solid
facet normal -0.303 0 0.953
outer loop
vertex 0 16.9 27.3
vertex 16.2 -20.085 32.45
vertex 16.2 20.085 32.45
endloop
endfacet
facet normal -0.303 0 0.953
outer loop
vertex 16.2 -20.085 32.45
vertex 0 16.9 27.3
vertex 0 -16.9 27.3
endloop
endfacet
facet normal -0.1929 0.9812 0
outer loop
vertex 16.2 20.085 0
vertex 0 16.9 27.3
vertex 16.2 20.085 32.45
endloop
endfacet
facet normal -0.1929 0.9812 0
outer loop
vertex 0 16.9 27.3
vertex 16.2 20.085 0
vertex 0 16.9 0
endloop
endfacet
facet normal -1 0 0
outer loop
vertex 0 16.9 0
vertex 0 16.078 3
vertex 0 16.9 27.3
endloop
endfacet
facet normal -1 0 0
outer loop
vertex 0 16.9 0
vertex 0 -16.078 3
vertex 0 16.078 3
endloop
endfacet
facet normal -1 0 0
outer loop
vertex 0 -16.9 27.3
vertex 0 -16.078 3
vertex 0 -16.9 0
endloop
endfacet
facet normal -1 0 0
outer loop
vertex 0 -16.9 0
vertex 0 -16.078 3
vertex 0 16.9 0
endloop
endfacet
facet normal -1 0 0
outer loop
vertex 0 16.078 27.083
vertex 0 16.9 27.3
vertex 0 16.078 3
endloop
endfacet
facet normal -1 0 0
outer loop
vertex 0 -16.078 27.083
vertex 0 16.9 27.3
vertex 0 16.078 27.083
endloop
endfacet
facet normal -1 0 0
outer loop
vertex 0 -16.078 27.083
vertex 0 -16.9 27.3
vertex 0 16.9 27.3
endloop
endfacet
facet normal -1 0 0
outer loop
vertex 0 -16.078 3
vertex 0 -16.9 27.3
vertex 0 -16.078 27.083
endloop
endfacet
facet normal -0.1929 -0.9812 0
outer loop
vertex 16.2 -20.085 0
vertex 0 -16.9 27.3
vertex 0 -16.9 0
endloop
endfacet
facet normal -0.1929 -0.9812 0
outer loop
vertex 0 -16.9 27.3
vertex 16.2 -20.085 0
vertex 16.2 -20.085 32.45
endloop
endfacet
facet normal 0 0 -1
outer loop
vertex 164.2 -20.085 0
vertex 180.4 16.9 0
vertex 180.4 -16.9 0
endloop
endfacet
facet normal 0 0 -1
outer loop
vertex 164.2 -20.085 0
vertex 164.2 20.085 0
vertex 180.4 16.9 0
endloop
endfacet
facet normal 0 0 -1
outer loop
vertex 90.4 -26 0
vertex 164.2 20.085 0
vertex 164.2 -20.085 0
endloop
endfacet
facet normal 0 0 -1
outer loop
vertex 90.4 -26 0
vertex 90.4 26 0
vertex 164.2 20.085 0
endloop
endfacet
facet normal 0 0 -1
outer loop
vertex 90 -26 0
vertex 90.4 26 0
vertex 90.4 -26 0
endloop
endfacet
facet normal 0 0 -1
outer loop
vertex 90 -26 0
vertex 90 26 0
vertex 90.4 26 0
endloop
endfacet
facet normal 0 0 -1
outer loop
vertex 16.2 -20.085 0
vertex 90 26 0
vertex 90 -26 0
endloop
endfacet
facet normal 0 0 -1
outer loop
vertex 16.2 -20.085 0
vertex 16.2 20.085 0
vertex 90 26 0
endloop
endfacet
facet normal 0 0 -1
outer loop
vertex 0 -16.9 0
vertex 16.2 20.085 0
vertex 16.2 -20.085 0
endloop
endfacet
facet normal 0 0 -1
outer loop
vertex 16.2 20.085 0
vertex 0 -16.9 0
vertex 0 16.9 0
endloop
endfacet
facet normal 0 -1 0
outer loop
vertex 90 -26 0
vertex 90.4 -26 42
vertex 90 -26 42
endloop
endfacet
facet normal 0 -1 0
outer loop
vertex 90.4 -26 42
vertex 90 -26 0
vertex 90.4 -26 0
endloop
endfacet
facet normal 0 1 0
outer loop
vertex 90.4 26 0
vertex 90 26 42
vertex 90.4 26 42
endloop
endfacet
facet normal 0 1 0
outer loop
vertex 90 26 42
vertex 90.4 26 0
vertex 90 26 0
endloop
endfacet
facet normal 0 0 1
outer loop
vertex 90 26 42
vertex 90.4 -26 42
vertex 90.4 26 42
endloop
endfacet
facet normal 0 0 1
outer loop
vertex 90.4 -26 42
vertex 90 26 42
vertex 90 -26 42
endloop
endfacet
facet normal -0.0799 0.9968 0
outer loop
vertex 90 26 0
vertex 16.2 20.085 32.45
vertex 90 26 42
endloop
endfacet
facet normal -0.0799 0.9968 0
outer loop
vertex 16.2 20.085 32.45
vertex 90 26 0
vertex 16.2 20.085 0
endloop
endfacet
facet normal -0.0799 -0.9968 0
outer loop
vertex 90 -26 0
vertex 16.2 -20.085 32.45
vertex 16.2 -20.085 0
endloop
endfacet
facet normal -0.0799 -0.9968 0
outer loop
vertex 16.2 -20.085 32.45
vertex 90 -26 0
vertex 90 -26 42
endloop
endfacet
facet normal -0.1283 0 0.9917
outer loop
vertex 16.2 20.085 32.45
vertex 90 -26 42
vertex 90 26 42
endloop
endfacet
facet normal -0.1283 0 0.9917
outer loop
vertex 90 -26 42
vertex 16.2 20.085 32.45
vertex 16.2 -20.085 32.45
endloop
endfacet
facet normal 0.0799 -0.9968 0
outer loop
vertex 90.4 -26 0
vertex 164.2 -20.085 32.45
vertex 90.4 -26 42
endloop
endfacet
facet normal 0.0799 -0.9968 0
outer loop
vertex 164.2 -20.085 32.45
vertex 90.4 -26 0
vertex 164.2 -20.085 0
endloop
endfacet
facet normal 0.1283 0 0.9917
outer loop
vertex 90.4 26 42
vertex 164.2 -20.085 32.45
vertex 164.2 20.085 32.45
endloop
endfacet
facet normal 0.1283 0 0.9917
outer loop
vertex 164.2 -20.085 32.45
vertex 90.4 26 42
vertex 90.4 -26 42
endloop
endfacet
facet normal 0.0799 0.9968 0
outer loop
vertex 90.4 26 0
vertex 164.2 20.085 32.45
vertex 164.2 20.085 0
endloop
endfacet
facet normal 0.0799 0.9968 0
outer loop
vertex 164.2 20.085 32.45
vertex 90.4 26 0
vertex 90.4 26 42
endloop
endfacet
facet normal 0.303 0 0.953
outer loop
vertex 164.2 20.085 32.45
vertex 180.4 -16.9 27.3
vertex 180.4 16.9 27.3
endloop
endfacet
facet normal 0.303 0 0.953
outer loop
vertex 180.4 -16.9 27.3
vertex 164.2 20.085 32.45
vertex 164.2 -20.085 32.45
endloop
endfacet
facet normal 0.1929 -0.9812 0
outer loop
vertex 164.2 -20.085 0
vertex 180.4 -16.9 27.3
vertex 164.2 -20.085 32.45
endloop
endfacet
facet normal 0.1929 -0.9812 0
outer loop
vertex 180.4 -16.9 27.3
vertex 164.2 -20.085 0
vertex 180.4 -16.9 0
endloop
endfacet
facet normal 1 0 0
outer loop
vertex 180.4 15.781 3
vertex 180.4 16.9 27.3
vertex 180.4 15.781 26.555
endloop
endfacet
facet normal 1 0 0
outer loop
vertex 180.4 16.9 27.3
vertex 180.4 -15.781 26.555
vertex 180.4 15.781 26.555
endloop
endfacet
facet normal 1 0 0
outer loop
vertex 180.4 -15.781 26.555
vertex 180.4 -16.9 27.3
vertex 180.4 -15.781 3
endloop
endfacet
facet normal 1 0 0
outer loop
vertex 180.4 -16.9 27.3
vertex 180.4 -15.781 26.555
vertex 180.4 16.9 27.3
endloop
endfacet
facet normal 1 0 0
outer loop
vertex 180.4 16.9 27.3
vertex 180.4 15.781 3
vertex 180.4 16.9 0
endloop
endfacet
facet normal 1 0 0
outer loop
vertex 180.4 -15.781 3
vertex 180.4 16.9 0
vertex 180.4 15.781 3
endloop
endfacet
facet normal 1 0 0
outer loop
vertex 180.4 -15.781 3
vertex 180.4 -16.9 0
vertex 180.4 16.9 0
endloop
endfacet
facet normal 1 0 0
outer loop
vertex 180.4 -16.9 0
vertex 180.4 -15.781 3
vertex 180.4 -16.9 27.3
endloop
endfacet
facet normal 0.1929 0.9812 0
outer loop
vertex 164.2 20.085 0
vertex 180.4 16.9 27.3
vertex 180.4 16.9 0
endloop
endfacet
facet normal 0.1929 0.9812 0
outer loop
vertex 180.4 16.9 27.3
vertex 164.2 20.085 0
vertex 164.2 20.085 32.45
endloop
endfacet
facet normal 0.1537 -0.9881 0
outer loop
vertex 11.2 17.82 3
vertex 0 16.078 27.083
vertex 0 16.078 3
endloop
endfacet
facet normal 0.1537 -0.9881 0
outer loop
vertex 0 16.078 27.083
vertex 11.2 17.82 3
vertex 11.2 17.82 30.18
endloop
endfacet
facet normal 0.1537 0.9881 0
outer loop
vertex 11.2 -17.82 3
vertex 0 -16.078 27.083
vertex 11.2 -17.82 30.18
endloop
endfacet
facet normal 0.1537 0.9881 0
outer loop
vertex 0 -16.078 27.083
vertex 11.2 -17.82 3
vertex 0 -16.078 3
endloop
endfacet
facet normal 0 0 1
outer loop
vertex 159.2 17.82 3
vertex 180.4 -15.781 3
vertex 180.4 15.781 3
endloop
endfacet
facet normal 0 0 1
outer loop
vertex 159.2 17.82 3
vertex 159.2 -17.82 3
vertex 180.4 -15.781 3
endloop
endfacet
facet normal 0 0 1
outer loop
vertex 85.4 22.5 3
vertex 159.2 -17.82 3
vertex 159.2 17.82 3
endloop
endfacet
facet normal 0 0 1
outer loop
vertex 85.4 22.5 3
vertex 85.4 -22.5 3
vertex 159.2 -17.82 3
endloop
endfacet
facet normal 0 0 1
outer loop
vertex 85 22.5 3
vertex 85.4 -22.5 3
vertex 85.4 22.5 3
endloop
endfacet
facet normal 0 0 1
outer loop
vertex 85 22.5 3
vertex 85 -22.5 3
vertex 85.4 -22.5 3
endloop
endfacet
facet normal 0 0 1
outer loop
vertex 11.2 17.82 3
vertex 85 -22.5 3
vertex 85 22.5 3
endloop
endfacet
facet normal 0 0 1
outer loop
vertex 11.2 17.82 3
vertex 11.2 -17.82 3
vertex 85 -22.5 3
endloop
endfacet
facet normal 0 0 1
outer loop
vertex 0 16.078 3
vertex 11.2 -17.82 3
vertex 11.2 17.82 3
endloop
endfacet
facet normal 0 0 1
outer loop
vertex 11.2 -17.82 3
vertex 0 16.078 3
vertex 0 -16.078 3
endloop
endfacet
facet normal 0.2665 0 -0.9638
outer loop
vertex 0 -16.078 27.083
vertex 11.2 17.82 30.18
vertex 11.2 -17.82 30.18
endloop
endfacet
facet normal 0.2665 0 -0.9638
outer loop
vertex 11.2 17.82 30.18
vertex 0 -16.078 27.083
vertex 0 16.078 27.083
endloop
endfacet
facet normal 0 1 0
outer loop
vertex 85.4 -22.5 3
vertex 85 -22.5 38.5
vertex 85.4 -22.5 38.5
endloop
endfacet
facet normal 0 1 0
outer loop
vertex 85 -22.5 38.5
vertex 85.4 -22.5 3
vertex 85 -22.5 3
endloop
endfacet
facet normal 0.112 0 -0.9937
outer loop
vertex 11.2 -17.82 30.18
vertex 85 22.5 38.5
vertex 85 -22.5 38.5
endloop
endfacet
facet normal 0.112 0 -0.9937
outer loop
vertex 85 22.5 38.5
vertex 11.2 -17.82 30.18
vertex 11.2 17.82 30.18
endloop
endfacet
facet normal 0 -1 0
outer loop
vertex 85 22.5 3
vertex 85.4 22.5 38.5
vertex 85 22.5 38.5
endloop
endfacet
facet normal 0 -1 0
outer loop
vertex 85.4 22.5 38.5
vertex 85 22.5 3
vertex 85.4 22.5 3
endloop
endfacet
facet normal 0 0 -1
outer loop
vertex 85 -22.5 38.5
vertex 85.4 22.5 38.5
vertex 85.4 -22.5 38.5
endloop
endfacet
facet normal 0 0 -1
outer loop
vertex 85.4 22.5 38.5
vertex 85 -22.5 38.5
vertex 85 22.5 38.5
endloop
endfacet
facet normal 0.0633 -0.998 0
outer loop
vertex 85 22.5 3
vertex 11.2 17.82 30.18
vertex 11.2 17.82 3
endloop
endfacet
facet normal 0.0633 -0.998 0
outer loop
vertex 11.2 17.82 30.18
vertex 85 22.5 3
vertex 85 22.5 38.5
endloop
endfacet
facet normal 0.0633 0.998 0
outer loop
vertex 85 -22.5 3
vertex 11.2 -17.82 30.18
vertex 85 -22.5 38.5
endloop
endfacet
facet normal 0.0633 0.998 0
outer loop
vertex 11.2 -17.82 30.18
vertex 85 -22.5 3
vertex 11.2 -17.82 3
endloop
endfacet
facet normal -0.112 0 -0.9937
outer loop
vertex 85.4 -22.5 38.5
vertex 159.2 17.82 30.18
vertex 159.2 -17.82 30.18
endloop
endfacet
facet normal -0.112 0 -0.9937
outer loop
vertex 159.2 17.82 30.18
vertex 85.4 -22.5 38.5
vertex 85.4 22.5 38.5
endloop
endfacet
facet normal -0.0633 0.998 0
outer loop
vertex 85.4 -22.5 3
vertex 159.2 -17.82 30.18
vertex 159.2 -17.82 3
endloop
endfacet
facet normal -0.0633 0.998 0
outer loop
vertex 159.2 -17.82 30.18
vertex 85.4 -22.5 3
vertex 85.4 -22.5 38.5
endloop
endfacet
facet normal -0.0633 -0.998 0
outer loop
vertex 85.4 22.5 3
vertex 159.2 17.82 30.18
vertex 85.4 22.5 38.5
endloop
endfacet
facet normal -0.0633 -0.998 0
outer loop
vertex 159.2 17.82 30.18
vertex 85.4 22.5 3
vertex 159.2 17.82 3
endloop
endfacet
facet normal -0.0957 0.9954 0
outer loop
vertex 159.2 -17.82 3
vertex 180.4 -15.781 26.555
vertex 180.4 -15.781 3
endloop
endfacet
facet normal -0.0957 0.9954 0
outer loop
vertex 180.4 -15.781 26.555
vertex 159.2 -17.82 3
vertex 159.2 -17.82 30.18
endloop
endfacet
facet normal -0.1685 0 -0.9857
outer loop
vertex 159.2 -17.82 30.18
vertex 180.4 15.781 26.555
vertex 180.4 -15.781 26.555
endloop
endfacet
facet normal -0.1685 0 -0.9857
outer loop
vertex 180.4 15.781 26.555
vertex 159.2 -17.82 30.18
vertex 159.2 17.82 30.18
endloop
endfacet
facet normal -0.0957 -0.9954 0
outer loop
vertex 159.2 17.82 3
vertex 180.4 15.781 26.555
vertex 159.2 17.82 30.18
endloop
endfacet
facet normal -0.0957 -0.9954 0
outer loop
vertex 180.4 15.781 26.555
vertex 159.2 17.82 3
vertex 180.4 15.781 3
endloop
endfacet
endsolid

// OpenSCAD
$fn = 32;

// ----------------------------------------------------------------------
// Faired channel: 180 x 52 x 42 mm, 3.5 mm walls, faired ends
// ----------------------------------------------------------------------

// --- parameters (mm) ---
length = 180;             // channel length
width = 52;               // channel width at mid length
height = 42;              // channel height at mid length
wall = 3.5;               // side wall thickness
floor_t = 3;              // floor thickness
end_w = 33.8;             // faired end width
end_h = 27.3;             // faired end height

difference() {
  union() {
    hull() {
      translate([0, -16.9, 0]) cube([0.4, 33.8, 27.3]);
      translate([16.2, -20.085, 0]) cube([0.4, 40.17, 32.45]);
    }
    hull() {
      translate([16.2, -20.085, 0]) cube([0.4, 40.17, 32.45]);
      translate([90, -26, 0]) cube([0.4, 52, 42]);
    }
    hull() {
      translate([90, -26, 0]) cube([0.4, 52, 42]);
      translate([163.8, -20.085, 0]) cube([0.4, 40.17, 32.45]);
    }
    hull() {
      translate([163.8, -20.085, 0]) cube([0.4, 40.17, 32.45]);
      translate([180, -16.9, 0]) cube([0.4, 33.8, 27.3]);
    }
  }
  /* cavity, 5 mm proud of both ends so the ports are cut clean */
  hull() {
    translate([-5, -15.3, 3]) cube([0.4, 30.6, 22.7]);
    translate([11.2, -17.82, 3]) cube([0.4, 35.64, 27.18]);
  }
  hull() {
    translate([11.2, -17.82, 3]) cube([0.4, 35.64, 27.18]);
    translate([85, -22.5, 3]) cube([0.4, 45, 35.5]);
  }
  hull() {
    translate([85, -22.5, 3]) cube([0.4, 45, 35.5]);
    translate([158.8, -17.82, 3]) cube([0.4, 35.64, 27.18]);
  }
  hull() {
    translate([158.8, -17.82, 3]) cube([0.4, 35.64, 27.18]);
    translate([185, -15.3, 3]) cube([0.4, 30.6, 22.7]);
  }
}
